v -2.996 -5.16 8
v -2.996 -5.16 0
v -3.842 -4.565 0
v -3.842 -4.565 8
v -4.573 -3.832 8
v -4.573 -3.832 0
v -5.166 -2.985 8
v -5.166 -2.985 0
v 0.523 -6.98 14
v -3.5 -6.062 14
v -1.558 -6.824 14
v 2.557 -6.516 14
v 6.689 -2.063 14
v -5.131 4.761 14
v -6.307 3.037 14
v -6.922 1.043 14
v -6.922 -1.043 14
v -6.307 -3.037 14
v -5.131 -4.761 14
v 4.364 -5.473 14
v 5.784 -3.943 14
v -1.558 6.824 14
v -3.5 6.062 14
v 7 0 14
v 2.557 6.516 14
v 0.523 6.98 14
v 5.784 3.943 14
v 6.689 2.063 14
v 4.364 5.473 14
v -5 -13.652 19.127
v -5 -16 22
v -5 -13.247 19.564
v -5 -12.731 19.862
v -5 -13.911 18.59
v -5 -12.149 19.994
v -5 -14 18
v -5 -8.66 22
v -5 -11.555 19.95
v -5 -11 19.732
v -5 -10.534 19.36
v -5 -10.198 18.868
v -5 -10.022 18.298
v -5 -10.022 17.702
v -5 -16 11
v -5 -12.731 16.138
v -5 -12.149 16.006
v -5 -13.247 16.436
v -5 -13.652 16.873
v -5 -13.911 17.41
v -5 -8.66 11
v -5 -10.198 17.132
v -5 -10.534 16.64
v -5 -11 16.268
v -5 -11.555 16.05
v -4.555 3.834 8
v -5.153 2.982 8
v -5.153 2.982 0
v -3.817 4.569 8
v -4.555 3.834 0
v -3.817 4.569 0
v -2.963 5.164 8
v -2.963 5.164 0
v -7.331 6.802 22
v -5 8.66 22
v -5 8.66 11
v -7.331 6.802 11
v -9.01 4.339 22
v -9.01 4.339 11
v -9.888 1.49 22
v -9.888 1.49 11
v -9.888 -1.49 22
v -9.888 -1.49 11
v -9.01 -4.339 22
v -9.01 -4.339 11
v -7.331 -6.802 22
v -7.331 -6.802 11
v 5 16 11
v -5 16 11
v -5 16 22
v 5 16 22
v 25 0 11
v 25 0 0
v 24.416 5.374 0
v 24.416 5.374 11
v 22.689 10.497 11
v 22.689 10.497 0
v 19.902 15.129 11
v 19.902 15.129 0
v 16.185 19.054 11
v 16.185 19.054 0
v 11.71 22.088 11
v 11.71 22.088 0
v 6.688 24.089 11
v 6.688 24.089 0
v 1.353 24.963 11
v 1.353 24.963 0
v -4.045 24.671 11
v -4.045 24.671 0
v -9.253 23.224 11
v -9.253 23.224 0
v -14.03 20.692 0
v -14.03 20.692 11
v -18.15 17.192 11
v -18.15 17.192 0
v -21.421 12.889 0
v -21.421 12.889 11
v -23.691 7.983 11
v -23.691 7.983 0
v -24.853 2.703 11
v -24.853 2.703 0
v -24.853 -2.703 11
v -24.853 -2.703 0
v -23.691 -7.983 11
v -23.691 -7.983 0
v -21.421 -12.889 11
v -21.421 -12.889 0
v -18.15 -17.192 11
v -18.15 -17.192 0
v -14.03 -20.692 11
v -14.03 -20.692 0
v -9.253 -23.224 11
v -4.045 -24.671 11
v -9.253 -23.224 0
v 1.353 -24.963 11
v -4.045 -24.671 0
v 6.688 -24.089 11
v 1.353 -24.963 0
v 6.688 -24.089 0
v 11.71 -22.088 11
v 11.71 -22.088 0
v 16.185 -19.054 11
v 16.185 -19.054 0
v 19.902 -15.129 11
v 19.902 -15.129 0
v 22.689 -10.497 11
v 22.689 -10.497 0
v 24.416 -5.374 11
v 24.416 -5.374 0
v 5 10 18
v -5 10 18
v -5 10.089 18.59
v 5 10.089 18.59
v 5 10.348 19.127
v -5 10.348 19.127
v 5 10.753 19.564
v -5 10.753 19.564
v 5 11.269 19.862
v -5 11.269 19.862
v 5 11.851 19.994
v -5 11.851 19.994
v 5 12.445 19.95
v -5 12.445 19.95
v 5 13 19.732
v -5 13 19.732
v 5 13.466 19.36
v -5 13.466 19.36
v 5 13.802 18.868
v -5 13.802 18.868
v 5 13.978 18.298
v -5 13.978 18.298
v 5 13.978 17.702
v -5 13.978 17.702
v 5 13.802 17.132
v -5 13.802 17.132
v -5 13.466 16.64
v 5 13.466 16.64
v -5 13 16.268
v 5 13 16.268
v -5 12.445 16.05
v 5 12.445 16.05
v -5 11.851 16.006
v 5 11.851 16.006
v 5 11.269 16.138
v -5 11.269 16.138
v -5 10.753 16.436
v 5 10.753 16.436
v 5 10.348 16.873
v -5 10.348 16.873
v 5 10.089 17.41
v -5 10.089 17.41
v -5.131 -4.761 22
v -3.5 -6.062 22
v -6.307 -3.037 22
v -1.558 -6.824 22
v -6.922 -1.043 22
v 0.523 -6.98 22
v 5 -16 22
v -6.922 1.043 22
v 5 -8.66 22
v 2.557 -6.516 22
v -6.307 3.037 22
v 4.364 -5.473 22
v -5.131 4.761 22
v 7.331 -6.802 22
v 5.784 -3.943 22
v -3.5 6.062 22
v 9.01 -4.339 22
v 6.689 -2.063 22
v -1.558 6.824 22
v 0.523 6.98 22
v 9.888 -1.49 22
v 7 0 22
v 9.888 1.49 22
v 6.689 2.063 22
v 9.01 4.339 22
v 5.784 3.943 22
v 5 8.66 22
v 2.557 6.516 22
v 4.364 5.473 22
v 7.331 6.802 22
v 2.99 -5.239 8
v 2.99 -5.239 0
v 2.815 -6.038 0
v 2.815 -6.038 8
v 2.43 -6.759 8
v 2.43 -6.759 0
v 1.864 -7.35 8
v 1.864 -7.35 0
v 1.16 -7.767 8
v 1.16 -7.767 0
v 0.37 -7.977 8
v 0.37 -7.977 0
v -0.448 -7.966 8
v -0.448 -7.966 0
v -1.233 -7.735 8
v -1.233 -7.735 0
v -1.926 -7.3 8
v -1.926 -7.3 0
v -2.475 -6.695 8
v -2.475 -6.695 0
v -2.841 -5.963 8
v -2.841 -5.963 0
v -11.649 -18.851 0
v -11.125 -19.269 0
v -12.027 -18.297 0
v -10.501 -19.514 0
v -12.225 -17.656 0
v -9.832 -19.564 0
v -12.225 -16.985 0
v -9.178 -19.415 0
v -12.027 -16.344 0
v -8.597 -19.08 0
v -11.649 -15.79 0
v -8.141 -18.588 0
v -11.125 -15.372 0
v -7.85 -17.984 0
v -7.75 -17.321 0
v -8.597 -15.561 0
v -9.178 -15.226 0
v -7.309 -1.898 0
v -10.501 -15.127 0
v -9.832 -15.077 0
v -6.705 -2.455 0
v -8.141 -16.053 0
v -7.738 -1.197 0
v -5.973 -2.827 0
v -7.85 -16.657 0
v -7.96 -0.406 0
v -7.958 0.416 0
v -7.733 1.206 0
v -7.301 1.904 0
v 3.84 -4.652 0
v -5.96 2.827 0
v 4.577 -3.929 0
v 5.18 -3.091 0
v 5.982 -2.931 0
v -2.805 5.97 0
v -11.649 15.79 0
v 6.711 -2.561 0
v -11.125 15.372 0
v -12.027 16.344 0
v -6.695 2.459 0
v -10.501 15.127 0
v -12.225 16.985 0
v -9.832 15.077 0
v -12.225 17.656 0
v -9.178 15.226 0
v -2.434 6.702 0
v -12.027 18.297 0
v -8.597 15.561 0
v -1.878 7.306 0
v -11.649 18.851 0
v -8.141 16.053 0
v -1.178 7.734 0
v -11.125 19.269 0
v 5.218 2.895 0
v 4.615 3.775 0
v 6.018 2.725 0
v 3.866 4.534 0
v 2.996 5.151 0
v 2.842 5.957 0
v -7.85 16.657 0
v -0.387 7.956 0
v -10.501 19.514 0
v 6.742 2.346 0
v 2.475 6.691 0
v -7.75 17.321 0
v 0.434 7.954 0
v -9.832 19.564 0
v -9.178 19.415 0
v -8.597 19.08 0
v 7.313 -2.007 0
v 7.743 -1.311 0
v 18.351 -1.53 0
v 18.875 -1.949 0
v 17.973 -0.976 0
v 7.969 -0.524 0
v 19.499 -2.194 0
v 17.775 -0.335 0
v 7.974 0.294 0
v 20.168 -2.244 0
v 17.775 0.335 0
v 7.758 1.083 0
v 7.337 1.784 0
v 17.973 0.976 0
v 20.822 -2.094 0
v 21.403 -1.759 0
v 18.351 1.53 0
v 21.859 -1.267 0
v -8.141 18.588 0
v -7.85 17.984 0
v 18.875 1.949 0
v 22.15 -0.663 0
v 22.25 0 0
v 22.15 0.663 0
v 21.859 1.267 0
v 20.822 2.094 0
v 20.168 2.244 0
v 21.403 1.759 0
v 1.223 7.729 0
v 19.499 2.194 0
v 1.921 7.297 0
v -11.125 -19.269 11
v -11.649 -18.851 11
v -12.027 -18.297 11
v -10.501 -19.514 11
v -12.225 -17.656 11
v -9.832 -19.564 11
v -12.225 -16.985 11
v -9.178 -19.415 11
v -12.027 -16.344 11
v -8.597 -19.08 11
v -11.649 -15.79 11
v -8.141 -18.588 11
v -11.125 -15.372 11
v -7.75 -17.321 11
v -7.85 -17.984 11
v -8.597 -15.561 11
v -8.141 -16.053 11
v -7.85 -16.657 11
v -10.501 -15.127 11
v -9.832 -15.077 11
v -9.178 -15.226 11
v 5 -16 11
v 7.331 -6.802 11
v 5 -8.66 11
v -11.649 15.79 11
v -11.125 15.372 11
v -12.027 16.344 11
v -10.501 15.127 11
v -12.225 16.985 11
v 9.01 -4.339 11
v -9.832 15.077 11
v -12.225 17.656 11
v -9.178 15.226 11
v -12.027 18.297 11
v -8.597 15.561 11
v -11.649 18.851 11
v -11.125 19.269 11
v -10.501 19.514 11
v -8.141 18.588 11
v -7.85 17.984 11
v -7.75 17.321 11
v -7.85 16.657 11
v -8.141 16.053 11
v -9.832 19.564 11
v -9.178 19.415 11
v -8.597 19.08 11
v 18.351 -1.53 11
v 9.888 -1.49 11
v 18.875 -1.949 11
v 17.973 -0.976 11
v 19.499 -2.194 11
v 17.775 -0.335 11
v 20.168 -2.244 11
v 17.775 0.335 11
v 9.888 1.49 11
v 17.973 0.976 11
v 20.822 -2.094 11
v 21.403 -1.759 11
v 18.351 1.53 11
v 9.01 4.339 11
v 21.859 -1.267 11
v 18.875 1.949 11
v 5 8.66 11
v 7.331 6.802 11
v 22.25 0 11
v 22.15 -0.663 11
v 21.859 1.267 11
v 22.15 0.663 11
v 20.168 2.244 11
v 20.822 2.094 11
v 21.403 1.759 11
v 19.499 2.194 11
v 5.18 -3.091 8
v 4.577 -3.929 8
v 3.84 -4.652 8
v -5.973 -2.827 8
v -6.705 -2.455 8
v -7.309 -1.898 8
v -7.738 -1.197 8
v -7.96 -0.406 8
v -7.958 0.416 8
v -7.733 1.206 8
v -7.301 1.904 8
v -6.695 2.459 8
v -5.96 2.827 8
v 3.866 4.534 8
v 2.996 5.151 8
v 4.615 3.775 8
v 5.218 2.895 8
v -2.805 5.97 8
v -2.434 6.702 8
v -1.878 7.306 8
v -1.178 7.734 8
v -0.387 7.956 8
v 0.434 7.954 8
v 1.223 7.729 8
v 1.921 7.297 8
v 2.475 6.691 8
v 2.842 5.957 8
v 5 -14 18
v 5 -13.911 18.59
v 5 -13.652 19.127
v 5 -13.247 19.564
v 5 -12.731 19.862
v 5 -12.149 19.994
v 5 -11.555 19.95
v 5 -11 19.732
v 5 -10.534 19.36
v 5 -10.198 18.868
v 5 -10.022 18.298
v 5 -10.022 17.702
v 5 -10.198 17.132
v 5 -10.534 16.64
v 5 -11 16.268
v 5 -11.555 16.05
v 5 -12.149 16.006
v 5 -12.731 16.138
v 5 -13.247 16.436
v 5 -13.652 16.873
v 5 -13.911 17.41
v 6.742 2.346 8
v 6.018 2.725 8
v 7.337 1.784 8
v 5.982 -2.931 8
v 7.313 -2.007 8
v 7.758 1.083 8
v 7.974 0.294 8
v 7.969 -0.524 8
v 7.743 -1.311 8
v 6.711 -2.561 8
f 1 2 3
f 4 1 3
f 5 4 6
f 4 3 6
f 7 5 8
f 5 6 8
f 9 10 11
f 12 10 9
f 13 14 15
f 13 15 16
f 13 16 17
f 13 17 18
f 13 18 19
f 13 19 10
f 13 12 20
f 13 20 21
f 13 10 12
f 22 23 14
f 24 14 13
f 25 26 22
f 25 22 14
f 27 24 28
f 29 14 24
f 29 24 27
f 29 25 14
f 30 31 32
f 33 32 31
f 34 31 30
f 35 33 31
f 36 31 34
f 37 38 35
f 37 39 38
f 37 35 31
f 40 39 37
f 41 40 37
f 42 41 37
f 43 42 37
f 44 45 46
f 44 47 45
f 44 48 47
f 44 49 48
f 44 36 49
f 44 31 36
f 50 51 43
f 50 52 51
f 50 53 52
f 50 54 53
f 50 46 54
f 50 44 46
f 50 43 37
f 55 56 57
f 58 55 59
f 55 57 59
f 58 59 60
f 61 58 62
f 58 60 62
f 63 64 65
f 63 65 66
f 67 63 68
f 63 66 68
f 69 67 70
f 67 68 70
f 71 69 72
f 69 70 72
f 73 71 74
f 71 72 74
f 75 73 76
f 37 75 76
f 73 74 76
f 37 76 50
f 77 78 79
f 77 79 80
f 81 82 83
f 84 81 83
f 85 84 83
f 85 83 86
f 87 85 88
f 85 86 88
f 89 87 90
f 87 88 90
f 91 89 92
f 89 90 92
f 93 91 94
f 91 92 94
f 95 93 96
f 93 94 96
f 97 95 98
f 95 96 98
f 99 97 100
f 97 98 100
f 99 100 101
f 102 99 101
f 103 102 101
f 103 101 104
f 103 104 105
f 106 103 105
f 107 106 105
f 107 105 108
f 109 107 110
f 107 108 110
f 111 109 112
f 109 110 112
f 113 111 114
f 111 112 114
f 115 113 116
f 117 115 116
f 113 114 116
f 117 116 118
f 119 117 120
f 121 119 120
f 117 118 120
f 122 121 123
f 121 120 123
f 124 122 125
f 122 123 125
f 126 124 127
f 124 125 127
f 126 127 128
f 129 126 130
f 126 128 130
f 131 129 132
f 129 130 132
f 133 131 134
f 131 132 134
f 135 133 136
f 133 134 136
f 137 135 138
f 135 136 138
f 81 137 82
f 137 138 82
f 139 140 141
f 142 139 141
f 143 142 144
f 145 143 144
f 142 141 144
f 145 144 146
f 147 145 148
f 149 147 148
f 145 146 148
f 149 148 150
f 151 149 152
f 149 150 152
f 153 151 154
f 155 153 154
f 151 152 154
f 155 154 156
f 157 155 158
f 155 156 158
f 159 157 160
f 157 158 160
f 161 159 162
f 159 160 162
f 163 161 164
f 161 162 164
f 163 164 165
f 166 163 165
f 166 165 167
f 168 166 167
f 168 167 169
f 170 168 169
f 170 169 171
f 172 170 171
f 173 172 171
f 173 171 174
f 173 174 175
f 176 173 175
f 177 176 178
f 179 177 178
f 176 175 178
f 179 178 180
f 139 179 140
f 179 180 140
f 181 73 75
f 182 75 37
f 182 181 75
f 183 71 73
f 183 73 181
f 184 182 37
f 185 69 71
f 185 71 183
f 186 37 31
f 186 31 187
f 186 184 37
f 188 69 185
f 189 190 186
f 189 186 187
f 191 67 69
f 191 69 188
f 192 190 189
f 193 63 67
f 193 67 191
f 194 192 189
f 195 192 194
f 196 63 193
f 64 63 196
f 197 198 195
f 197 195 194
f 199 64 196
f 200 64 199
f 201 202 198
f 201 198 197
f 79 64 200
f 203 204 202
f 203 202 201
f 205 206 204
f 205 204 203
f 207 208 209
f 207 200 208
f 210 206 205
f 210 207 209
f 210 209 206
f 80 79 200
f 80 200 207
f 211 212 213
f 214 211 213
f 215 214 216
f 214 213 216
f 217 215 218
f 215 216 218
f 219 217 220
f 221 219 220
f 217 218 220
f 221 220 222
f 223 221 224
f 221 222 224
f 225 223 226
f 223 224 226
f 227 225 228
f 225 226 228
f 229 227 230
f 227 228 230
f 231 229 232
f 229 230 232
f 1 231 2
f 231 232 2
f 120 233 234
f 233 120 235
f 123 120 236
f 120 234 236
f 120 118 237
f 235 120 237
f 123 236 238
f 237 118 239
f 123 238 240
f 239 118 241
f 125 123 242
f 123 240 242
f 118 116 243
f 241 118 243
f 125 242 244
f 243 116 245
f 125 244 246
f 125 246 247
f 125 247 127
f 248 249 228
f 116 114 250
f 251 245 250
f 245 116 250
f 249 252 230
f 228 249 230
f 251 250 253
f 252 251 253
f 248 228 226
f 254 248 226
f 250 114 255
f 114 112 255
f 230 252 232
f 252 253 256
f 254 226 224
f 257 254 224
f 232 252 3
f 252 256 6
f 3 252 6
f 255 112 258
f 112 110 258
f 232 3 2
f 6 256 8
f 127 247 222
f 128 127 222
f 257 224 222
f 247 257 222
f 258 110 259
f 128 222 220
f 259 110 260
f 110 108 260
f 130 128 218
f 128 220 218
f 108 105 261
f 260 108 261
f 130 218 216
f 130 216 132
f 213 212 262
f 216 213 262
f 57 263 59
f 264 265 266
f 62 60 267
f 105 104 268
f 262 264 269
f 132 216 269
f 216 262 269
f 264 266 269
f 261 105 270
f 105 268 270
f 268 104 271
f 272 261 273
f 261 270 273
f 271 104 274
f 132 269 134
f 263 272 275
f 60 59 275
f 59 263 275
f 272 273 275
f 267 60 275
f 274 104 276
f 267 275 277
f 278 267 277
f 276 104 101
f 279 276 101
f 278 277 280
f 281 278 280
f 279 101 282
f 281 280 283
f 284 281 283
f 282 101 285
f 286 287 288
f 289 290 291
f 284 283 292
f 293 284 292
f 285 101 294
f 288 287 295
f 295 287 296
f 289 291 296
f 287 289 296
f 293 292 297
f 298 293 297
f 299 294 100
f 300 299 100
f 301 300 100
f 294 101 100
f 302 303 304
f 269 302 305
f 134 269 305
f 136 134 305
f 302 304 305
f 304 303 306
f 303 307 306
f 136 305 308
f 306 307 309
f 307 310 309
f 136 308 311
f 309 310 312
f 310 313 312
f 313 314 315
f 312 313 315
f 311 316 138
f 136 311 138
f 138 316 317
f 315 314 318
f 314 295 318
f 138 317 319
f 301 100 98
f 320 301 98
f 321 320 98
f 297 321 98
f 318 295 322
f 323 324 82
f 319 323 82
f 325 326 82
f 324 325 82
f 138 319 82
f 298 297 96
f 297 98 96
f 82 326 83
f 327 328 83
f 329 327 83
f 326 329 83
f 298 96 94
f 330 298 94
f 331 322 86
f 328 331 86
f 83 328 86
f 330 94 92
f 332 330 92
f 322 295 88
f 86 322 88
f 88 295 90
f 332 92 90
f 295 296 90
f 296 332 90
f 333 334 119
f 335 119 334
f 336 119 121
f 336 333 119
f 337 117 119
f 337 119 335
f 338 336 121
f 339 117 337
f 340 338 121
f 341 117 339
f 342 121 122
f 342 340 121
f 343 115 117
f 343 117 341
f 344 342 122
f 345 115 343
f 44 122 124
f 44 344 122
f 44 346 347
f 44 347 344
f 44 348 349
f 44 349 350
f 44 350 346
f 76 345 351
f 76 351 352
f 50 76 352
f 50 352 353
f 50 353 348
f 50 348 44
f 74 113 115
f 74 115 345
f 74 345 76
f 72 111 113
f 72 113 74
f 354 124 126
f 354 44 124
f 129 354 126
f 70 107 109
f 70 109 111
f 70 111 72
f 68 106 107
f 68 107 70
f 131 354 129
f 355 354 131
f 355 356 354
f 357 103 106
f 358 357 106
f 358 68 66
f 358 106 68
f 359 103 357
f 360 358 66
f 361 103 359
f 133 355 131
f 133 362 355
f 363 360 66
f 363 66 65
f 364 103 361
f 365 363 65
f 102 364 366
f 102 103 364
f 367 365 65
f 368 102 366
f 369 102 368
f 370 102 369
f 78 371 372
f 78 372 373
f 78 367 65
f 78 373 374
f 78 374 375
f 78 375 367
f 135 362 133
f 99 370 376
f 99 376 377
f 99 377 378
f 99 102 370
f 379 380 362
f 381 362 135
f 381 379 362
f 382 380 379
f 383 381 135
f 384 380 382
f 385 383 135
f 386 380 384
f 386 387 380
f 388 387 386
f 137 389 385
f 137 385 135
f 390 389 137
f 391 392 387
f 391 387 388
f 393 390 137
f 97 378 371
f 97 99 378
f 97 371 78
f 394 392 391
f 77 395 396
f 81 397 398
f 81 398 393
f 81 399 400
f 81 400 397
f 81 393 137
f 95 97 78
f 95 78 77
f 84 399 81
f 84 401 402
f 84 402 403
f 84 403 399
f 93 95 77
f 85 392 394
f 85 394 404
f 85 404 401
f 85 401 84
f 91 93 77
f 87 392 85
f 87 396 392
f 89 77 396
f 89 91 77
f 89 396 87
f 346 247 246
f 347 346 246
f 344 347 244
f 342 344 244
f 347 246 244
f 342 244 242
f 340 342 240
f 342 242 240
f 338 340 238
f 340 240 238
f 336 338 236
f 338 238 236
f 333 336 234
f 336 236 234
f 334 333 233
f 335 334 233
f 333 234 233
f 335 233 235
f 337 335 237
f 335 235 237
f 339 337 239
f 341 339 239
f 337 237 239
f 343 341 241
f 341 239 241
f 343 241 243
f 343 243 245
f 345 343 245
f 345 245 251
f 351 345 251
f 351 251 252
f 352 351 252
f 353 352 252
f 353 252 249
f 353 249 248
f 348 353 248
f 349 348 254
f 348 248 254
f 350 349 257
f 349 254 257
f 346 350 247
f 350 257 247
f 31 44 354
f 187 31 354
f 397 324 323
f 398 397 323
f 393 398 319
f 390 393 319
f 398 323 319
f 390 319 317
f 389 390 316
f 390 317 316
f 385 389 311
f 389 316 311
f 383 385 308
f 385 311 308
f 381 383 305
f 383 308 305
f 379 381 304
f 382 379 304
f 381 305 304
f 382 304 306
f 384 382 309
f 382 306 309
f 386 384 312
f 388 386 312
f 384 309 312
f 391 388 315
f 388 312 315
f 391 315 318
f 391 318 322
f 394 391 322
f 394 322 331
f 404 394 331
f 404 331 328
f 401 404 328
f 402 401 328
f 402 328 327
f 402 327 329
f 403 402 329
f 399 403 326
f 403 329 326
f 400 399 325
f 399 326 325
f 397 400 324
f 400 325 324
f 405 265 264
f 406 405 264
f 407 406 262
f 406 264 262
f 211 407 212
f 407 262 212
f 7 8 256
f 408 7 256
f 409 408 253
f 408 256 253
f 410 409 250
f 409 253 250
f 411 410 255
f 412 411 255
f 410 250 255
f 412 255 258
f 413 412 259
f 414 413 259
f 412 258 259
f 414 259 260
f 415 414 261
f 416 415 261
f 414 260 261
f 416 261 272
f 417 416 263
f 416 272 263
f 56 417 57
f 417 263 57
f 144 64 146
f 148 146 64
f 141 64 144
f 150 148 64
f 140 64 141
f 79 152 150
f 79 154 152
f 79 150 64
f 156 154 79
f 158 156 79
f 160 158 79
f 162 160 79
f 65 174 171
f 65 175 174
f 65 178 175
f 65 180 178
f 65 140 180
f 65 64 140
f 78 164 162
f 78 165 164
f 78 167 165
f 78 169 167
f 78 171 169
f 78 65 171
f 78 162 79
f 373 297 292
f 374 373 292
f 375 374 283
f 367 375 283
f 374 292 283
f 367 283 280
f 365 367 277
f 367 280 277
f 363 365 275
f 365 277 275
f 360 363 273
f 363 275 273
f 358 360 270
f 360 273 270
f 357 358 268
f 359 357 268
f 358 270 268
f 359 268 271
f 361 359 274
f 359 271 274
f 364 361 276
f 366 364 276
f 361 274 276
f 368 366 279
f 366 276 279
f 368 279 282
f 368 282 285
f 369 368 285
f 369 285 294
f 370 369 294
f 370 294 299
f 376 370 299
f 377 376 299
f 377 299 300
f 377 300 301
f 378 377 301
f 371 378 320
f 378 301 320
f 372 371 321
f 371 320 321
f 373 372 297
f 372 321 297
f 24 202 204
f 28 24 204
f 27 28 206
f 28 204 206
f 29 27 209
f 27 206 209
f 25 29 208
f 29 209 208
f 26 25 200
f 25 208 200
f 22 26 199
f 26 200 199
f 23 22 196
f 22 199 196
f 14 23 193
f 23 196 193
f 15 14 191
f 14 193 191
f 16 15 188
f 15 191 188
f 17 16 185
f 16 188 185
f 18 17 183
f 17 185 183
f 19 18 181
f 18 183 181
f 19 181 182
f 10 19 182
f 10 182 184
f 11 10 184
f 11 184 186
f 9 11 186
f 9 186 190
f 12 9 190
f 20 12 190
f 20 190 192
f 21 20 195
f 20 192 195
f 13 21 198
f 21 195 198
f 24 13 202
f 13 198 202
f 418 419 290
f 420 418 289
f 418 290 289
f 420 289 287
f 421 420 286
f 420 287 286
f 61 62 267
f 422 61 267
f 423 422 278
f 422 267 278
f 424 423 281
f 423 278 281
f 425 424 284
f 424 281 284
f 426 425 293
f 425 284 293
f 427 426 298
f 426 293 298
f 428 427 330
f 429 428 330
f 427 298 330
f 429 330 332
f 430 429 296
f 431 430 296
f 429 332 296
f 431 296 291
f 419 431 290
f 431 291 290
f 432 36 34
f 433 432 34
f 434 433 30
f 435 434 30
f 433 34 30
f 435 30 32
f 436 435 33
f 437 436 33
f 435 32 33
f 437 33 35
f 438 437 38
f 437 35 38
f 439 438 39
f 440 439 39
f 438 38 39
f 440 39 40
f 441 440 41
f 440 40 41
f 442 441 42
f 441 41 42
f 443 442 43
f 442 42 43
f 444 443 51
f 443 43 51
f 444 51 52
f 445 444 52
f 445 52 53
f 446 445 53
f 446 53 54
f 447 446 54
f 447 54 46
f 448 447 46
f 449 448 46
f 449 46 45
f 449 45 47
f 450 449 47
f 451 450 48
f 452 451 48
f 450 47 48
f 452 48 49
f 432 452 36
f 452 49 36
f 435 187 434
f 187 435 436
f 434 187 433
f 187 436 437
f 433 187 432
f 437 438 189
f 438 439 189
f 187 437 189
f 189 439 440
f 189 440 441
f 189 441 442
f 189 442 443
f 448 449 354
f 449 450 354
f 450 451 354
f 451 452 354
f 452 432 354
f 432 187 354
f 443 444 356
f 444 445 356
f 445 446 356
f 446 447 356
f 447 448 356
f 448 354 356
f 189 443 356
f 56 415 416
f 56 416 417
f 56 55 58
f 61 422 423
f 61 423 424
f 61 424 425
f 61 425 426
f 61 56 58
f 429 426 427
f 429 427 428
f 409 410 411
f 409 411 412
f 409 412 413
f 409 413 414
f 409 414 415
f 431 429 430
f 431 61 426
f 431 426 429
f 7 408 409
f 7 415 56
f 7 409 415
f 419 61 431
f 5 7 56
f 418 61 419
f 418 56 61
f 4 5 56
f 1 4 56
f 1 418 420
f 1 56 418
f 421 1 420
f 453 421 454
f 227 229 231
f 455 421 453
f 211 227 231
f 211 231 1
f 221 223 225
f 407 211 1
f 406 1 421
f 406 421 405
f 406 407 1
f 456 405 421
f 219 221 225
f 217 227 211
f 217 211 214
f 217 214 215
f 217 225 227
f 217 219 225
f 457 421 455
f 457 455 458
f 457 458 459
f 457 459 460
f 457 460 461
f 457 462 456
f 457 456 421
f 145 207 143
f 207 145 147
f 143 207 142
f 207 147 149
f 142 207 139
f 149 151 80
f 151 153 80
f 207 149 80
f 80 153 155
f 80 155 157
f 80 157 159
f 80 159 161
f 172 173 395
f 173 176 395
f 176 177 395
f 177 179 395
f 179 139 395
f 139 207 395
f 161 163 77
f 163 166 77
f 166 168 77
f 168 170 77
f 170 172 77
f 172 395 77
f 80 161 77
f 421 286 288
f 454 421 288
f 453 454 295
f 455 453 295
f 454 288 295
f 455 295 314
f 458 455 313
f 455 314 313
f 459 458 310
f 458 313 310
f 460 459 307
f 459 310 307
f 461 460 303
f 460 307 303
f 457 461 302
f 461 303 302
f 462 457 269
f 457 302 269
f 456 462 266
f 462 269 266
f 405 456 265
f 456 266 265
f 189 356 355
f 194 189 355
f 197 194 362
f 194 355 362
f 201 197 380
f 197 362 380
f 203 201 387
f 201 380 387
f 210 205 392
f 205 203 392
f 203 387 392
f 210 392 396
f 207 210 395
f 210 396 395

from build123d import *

# Parameters (mm, degrees)
SKETCH_R        = 25
PAD_DEPTH       = 11
SKETCH001_W     = 10
SKETCH001_H     = 32
PAD001_DEPTH    = 11
SKETCH002_R     = 10
PAD002_DEPTH    = 11
SKETCH003_R     = 7
POCKET_DEPTH    = 8
SKETCH004_R     = 2.25
POCKET001_DEPTH = 11
POCKET002_DEPTH = 8
SKETCH006_R     = 2
POCKET003_DEPTH = 10


with BuildPart() as part:
    # Sketch → Pad (new body)
    with BuildSketch(Plane.XY):
        Circle(SKETCH_R)
    extrude(amount=PAD_DEPTH)

    # Sketch001 → Pad001 (new body)
    with BuildSketch(Plane.XY.offset(11)):
        Rectangle(SKETCH001_W, SKETCH001_H)
    extrude(amount=PAD001_DEPTH)

    # Sketch002 → Pad002 (new body)
    with BuildSketch(Plane.XY.offset(11)):
        Circle(SKETCH002_R)
    extrude(amount=PAD002_DEPTH)

    # Sketch003 → Pocket (cut)
    with BuildSketch(Plane.XY.offset(22)):
        Circle(SKETCH003_R)
    extrude(amount=-POCKET_DEPTH, mode=Mode.SUBTRACT)

    # Sketch004 → Pocket001 (cut)
    with BuildSketch(Plane(origin=(0, 0, 0), x_dir=(1, 0, 0), z_dir=(0, 0, -1))):
        with Locations((-10, 17.320508)):
            Circle(SKETCH004_R)
        with Locations((20, 0)):
            Circle(SKETCH004_R)
        with Locations((-10, -17.320508)):
            Circle(SKETCH004_R)
    extrude(amount=-POCKET001_DEPTH, mode=Mode.SUBTRACT)

    # Sketch005 → Pocket002 (cut)
    with BuildSketch(Plane(origin=(0, 0, 0), x_dir=(1, 0, 0), z_dir=(0, 0, -1))):
        with BuildLine():
            ThreePointArc((-2.995739, 5.15983), (-4.223459, 4.214344), (-5.16629, 2.984585))
            ThreePointArc((-5.16629, 2.984585), (-7.987609, -0.004867), (-5.153374, -2.982076))
            ThreePointArc((-5.153374, -2.982076), (-4.202268, -4.217936), (-2.962876, -5.164437))
            ThreePointArc((-2.962876, -5.164437), (0.02321, -7.983708), (2.996215, -5.150646))
            ThreePointArc((2.996215, -5.150646), (4.257192, -4.171102), (5.217582, -2.895476))
            ThreePointArc((5.217582, -2.895476), (7.999941, 0.115474), (5.179963, 3.09122))
            ThreePointArc((5.179963, 3.09122), (4.223984, 4.306463), (2.990483, 5.238766))
            ThreePointArc((2.990483, 5.238766), (-0.039555, 7.999739), (-2.995739, 5.15983))
        make_face()
    extrude(amount=-POCKET002_DEPTH, mode=Mode.SUBTRACT)

    # Sketch006 → Pocket003 (cut)
    with BuildSketch(Plane(origin=(-5, 0, 0), x_dir=(0, -1, 0), z_dir=(-1, 0, 0))):
        with Locations((-12, 18)):
            Circle(SKETCH006_R)
        with Locations((12, 18)):
            Circle(SKETCH006_R)
    extrude(amount=-POCKET003_DEPTH, mode=Mode.SUBTRACT)


solid = part.part
